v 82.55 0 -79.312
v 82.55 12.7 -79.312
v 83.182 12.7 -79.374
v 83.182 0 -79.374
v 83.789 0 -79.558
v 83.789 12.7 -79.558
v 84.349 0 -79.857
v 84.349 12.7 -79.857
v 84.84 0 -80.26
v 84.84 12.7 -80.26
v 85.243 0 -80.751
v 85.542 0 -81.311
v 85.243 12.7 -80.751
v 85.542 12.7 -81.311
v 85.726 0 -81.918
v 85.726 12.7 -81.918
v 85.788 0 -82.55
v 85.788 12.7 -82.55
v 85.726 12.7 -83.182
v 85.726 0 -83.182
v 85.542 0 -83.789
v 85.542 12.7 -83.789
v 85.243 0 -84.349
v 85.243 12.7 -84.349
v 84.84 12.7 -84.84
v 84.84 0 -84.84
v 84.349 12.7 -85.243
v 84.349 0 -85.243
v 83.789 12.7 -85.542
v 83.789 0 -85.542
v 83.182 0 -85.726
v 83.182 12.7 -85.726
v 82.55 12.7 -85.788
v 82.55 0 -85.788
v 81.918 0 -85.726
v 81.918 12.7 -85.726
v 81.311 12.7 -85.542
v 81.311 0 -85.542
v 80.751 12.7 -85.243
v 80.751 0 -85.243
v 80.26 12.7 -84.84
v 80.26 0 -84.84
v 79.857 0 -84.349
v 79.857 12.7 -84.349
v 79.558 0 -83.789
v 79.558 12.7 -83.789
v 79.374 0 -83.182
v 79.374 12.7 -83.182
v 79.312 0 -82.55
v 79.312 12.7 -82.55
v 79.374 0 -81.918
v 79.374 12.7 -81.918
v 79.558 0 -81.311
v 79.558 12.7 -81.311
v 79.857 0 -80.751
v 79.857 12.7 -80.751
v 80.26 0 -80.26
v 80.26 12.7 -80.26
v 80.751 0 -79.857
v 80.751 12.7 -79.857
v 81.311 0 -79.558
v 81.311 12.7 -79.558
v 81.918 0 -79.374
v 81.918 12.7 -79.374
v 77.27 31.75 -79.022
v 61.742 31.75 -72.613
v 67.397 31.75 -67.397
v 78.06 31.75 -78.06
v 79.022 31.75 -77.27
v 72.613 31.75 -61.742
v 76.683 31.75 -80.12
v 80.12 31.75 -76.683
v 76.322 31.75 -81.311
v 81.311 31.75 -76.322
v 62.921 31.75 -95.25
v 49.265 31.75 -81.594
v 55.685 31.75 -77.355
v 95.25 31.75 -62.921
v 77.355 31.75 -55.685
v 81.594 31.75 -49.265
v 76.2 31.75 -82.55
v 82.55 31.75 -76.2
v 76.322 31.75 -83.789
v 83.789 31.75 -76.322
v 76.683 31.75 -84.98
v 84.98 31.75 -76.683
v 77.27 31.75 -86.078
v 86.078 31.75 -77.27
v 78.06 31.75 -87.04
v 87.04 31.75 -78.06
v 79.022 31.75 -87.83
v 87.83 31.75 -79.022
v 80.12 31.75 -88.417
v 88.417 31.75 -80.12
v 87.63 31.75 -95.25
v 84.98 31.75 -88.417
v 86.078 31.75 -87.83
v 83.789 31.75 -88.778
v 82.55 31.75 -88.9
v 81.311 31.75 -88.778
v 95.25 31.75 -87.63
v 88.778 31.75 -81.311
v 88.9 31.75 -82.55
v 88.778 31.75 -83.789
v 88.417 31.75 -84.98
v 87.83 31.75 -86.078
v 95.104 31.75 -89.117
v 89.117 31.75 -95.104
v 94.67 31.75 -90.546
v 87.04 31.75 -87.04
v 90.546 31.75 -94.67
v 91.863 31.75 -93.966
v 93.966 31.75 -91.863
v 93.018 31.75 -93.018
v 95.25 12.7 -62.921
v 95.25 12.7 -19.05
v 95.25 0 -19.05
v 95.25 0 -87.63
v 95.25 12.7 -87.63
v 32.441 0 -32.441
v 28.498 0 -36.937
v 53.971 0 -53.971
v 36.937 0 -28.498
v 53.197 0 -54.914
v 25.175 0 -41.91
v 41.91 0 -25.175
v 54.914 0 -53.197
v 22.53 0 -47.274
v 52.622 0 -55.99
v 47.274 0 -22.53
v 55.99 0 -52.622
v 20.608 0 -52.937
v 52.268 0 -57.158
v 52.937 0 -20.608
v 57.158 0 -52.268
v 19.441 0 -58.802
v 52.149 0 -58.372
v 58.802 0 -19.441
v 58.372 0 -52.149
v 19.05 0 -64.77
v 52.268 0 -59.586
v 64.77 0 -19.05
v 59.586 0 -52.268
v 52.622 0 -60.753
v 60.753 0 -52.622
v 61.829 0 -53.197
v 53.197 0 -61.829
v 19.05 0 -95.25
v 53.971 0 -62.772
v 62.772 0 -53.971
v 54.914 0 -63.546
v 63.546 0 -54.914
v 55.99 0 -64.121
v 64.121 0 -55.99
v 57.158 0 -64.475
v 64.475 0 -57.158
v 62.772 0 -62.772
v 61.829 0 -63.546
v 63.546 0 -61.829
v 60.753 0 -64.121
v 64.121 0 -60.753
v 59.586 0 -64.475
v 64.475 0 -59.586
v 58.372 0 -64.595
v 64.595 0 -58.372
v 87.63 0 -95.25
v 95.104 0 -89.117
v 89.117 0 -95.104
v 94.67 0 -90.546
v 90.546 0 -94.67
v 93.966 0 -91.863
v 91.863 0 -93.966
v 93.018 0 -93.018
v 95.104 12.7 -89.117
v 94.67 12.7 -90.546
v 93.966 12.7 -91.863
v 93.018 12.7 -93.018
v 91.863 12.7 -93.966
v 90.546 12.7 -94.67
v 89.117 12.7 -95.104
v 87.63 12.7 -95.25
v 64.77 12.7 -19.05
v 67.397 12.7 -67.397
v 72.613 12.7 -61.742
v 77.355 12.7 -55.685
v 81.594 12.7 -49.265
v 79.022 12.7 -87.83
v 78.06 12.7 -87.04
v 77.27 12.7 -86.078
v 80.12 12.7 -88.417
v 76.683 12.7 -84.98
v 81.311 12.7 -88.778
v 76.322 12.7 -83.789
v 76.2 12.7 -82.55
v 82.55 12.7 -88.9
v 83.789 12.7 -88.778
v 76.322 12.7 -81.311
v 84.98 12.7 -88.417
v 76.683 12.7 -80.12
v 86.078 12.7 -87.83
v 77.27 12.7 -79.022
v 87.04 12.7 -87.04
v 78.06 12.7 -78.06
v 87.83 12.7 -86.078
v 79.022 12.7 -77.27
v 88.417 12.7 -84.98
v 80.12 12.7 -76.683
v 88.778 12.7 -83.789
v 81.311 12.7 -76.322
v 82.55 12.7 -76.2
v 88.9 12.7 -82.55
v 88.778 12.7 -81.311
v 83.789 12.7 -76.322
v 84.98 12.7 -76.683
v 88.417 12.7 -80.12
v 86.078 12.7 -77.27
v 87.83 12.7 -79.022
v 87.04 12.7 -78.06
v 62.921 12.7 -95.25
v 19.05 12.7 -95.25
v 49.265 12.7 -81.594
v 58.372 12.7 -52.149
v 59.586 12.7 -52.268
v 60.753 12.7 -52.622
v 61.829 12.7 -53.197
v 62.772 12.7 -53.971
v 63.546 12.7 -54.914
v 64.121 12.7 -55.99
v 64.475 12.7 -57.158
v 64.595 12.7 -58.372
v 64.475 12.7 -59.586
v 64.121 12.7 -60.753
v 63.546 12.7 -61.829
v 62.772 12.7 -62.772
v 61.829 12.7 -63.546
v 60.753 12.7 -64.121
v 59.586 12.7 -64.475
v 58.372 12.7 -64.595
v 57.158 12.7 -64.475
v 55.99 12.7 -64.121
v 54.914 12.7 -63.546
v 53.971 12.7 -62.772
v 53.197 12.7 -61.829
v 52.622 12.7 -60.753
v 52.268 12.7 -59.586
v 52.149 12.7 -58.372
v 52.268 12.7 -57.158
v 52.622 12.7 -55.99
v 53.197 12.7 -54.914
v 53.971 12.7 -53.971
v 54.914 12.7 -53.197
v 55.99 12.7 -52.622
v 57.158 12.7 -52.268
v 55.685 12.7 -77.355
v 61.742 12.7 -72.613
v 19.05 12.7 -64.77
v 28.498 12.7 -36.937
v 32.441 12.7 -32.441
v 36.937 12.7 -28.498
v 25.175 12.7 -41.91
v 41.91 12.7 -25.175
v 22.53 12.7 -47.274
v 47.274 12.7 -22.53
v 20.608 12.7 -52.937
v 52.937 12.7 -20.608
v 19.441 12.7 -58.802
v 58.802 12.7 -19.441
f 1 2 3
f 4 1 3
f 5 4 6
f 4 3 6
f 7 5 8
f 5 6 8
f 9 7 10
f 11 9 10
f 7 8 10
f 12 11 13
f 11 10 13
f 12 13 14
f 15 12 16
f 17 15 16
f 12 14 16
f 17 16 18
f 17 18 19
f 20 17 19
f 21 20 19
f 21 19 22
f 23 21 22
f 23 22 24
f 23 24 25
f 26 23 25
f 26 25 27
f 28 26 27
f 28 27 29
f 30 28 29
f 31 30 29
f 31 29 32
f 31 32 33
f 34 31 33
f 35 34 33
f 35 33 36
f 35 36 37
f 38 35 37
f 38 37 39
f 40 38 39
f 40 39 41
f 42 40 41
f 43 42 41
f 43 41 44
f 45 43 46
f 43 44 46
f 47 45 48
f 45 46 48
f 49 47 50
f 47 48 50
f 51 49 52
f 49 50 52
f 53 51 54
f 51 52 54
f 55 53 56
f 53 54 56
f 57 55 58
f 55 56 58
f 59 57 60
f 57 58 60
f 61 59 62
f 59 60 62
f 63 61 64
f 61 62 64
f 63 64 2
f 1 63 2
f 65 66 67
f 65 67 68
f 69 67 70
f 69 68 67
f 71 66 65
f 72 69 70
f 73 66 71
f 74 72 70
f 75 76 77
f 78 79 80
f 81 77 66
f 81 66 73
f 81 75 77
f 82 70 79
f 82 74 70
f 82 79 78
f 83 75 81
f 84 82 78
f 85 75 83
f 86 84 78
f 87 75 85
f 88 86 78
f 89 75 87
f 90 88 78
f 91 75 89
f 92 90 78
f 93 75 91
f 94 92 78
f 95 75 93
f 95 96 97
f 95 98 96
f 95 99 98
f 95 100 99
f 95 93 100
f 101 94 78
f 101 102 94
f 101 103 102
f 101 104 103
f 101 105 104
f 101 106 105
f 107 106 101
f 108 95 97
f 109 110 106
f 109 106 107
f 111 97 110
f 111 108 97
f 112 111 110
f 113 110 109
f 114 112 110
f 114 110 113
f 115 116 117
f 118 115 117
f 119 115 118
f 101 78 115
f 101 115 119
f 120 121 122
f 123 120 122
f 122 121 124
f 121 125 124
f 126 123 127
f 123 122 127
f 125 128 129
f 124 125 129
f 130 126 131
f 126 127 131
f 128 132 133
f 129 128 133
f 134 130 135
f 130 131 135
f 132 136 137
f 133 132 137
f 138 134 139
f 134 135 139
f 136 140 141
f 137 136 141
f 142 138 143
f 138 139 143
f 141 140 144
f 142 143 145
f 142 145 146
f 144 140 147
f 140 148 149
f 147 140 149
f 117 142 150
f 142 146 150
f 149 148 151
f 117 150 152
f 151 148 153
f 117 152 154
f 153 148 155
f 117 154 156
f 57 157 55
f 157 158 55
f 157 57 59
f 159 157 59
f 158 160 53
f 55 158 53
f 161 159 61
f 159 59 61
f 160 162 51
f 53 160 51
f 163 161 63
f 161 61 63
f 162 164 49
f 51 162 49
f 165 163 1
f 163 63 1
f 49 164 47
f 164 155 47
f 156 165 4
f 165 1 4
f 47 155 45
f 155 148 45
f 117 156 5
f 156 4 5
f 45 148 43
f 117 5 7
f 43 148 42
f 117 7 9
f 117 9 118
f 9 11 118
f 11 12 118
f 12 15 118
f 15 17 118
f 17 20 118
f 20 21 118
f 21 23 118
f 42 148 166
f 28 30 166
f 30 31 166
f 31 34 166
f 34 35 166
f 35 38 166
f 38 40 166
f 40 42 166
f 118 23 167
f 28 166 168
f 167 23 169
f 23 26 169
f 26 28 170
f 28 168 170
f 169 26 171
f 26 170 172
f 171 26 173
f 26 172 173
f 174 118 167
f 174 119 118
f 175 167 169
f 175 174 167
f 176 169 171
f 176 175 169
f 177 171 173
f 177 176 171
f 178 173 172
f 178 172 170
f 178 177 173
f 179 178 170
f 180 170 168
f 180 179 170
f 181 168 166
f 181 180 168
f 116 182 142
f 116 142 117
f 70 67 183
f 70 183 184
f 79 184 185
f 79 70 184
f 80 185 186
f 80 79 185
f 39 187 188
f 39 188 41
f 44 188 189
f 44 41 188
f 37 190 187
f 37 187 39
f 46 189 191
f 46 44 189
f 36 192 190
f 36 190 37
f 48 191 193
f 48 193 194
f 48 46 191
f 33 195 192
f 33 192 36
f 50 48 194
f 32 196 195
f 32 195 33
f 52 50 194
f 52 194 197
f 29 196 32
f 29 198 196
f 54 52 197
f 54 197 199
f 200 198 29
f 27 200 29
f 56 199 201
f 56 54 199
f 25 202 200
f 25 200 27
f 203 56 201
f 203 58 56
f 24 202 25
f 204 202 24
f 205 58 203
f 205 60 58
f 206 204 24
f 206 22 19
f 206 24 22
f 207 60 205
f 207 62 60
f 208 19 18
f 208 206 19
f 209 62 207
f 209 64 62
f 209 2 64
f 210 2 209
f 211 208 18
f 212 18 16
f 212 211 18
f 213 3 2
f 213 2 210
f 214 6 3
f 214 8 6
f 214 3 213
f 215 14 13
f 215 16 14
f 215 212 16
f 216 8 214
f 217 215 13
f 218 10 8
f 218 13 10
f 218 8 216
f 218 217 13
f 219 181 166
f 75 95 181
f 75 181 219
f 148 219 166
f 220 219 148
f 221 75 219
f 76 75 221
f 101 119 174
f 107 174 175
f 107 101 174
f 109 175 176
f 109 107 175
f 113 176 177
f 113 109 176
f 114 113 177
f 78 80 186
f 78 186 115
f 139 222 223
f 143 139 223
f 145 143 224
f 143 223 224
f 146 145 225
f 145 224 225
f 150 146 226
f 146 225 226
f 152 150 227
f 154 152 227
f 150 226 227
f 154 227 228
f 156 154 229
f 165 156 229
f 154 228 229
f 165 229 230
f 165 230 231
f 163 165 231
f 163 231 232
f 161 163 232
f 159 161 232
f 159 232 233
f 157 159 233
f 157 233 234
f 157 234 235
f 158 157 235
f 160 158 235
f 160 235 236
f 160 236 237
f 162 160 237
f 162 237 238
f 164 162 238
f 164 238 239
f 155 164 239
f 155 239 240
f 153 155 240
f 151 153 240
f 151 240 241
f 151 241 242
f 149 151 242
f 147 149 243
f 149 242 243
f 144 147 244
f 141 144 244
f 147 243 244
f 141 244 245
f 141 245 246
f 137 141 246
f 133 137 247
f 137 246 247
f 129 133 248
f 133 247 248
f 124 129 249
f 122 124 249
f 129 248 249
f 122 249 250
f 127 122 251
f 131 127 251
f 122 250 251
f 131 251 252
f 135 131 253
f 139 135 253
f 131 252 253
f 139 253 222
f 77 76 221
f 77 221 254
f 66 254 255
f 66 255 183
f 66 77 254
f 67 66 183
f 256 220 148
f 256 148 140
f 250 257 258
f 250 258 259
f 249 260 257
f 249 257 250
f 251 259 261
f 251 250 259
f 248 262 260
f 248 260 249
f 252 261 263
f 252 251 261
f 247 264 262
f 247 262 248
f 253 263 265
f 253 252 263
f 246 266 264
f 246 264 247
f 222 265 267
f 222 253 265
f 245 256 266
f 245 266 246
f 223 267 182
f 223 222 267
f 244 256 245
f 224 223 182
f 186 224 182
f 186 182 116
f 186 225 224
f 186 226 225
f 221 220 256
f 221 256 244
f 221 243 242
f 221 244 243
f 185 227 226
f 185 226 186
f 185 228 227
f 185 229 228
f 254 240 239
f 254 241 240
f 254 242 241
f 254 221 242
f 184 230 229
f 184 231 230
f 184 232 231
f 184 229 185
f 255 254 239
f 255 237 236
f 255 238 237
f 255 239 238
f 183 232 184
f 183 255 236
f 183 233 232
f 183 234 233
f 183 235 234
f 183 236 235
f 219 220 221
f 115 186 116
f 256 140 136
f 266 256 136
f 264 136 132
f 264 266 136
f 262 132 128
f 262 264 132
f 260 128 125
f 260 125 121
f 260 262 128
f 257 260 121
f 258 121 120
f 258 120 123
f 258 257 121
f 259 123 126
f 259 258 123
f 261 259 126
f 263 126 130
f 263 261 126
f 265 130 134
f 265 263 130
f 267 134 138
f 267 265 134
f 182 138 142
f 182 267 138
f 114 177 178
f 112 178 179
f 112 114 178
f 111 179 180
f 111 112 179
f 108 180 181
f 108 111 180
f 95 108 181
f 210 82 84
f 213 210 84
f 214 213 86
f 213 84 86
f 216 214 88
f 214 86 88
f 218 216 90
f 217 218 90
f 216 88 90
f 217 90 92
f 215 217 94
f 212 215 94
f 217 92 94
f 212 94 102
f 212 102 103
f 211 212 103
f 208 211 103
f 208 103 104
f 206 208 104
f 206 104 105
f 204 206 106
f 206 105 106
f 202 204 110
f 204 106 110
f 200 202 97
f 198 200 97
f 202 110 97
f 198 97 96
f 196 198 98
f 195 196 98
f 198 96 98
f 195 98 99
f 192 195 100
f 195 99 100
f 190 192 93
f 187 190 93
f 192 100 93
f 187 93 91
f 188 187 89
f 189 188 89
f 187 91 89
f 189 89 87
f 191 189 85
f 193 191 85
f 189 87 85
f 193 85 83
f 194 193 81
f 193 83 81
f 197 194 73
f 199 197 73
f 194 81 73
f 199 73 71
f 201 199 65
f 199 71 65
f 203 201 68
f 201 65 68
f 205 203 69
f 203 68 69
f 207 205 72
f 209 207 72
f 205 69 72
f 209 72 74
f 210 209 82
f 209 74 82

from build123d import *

# Parameters (mm, degrees)
SKETCH1_W               = 190.5
SKETCH1_H               = 190.5
BOSS_EXTRUDE1_DEPTH     = 12.7
FILLET1_R               = 7.62
BOSS_EXTRUDE3_START     = 19.05
BOSS_EXTRUDE3_DEPTH     = 19.05
CIRPATTERN1_COUNT       = 4
SKETCH8_R               = 6.223
CUT_EXTRUDE2_DEPTH      = 25.4
CUT_EXTRUDE6_DEPTH      = 137.044211564
CUT_EXTRUDE6_DEPTH_BACK = 137.044211564
SKETCH10_R              = 6.223
SKETCH11_R              = 6.35
SKETCH11_R_2            = 3.2385
CUT_EXTRUDE7_DEPTH      = 19.05
SKETCH11_4_R            = 3.2385
CUT_EXTRUDE8_DEPTH      = 139.395041457
FILLET3_R               = 12.7
BOSS_EXTRUDE5_DEPTH     = 12.7


with BuildPart() as part:
    # Sketch1 → Boss-Extrude1 (new body)
    with BuildSketch(Plane(origin=(0, 0, 0), x_dir=(1, 0, 0), z_dir=(0, 1, 0))):
        Rectangle(SKETCH1_W, SKETCH1_H)
    extrude(amount=BOSS_EXTRUDE1_DEPTH)

    # Fillet1
    fillet1_edges = [part.edges().sort_by_distance(p)[0] for p in [
        (95.25, 6.35, 95.25),
        (-95.25, 6.35, 95.25),
        (-95.25, 6.35, -95.25),
        (95.25, 6.35, -95.25),
    ]]
    fillet(fillet1_edges, radius=FILLET1_R)

    # Sketch7 → Boss-Extrude3 (add)
    with BuildSketch(Plane(origin=(0, 12.7, 0), x_dir=(1, 0, 0), z_dir=(0, 1, 0)).offset(BOSS_EXTRUDE3_START)):
        with BuildLine():
            Line((67.396822189, 67.396822189), (93.018153673, 93.018153673))
            ThreePointArc((93.018153673, 93.018153673), (90.546047755, 94.669962038), (87.63, 95.25))
            Line((87.63, 95.25), (62.921077964, 95.25))
            Line((62.921077964, 95.25), (49.265209936, 81.594131972))
            ThreePointArc((49.265209936, 81.594131972), (58.761367718, 75.045086089), (67.396822189, 67.396822189))
        make_face()
        with BuildLine():
            ThreePointArc((95.25, 87.63), (94.669962038, 90.546047755), (93.018153673, 93.018153673))
            Line((93.018153673, 93.018153673), (67.396822189, 67.396822189))
            ThreePointArc((67.396822189, 67.396822189), (75.045086089, 58.761367718), (81.594131972, 49.265209936))
            Line((81.594131972, 49.265209936), (95.25, 62.921077964))
            Line((95.25, 62.921077964), (95.25, 87.63))
        make_face()
    boss_extrude3 = extrude(amount=-BOSS_EXTRUDE3_DEPTH)

    # CirPattern1: Boss-Extrude3 ×4 about axis
    cirpattern1_axis = Axis((0, 0, 0), (0, 1, 0))
    for i in range(1, CIRPATTERN1_COUNT):
        add(boss_extrude3.rotate(cirpattern1_axis, i * 360 / CIRPATTERN1_COUNT))

    # Sketch8 → Cut-Extrude2 (cut)
    with BuildSketch(Plane(origin=(0, 12.7, 0), x_dir=(1, 0, 0), z_dir=(0, 1, 0))):
        with Locations(Location((0, 82.55, 0), (0, 0, 270))):
            Circle(SKETCH8_R)
        with Locations(Location((58.371664787, 58.371664787, 0), (0, 0, 270))):
            Circle(SKETCH8_R)
        with Locations(Location((82.55, 0, 0), (0, 0, 270))):
            Circle(SKETCH8_R)
        with Locations(Location((58.371664787, -58.371664787, 0), (0, 0, 270))):
            Circle(SKETCH8_R)
        with Locations(Location((0, -82.55, 0), (0, 0, 270))):
            Circle(SKETCH8_R)
        with Locations(Location((-58.371664787, -58.371664787, 0), (0, 0, 270))):
            Circle(SKETCH8_R)
        with Locations(Location((-82.55, 0, 0), (0, 0, 270))):
            Circle(SKETCH8_R)
        with Locations(Location((-58.371664787, 58.371664787, 0), (0, 0, 270))):
            Circle(SKETCH8_R)
    extrude(amount=-CUT_EXTRUDE2_DEPTH, mode=Mode.SUBTRACT)

    # Sketch10 → Cut-Extrude6 (cut, two sides: drawn at the far end of the back side and taken through both)
    with BuildSketch(Plane(origin=(0, 12.7, 0), x_dir=(1, 0, 0), z_dir=(0, 1, 0)).offset(-CUT_EXTRUDE6_DEPTH_BACK)):
        with BuildLine():
            Line((95.25, -62.921077964), (95.25, 38.1))
            Line((95.25, 38.1), (38.1, 38.1))
            Line((38.1, 38.1), (38.1, 95.25))
            Line((38.1, 95.25), (-62.921077964, 95.25))
            Line((-62.921077964, 95.25), (-49.265209936, 81.594131972))
            ThreePointArc((-49.265209936, 81.594131972), (-67.396822189, 67.396822189), (-81.594131972, 49.265209936))
            Line((-81.594131972, 49.265209936), (-95.25, 62.921077964))
            Line((-95.25, 62.921077964), (-95.25, -62.921077964))
            Line((-95.25, -62.921077964), (-81.594131972, -49.265209936))
            ThreePointArc((-81.594131972, -49.265209936), (-67.396822189, -67.396822189), (-49.265209936, -81.594131972))
            Line((-49.265209936, -81.594131972), (-62.921077964, -95.25))
            Line((-62.921077964, -95.25), (62.921077964, -95.25))
            Line((62.921077964, -95.25), (49.265209936, -81.594131972))
            ThreePointArc((49.265209936, -81.594131972), (67.396822189, -67.396822189), (81.594131972, -49.265209936))
            Line((81.594131972, -49.265209936), (95.25, -62.921077964))
        make_face()
        with Locations((-58.371664787, -58.371664787)):
            Circle(SKETCH10_R, mode=Mode.SUBTRACT)
        with Locations((-82.55, 0)):
            Circle(SKETCH10_R, mode=Mode.SUBTRACT)
        with Locations((0, -82.55)):
            Circle(SKETCH10_R, mode=Mode.SUBTRACT)
        with Locations((58.371664787, -58.371664787)):
            Circle(SKETCH10_R, mode=Mode.SUBTRACT)
        with Locations((-58.371664787, 58.371664787)):
            Circle(SKETCH10_R, mode=Mode.SUBTRACT)
        with Locations((0, 82.55)):
            Circle(SKETCH10_R, mode=Mode.SUBTRACT)
        with Locations((82.55, 0)):
            Circle(SKETCH10_R, mode=Mode.SUBTRACT)
    extrude(amount=CUT_EXTRUDE6_DEPTH + CUT_EXTRUDE6_DEPTH_BACK, mode=Mode.SUBTRACT)


with BuildPart() as cut_extrude6_kept_piece:
    # of the separate pieces the step leaves, the one the design keeps (cut_extrude6_pieces_kept)
    add(part.part.solids().sort_by_distance((38.1, 0, -38.1))[0])

    # Sketch11 → Cut-Extrude7 (cut)
    with BuildSketch(Plane(origin=(0, 31.75, 0), x_dir=(1, 0, 0), z_dir=(0, 1, 0))):
        with Locations(Location((82.55, 82.55, 0), (0, 0, 270))):
            Circle(SKETCH11_R)
        with Locations(Location((82.55, 82.55, 0), (0, 0, 270))):
            Circle(SKETCH11_R_2, mode=Mode.SUBTRACT)
    extrude(amount=-CUT_EXTRUDE7_DEPTH, mode=Mode.SUBTRACT)

    # Sketch11<4> → Cut-Extrude8 (cut, through all)
    with BuildSketch(Plane(origin=(0, 31.75, 0), x_dir=(1, 0, 0), z_dir=(0, 1, 0))):
        with Locations(Location((82.55, 82.55, 0), (0, 0, 270))):
            Circle(SKETCH11_4_R)
    extrude(amount=-CUT_EXTRUDE8_DEPTH, mode=Mode.SUBTRACT)

    # Fillet3
    fillet3_edges = [cut_extrude6_kept_piece.edges().sort_by_distance(p)[0] for p in [
        (38.1, 6.35, -95.25),
        (38.1, 6.35, -38.1),
        (95.25, 6.35, -38.1),
    ]]
    fillet(fillet3_edges, radius=FILLET3_R)

    # Sketch12 → Boss-Extrude5 (add)
    with BuildSketch(Plane(origin=(0, 12.7, 0), x_dir=(1, 0, 0), z_dir=(0, 1, 0))):
        with BuildLine():
            ThreePointArc((38.1, 82.55), (41.819743879, 91.530256121), (50.8, 95.25))
            Line((50.8, 95.25), (19.05, 95.25))
            Line((19.05, 95.25), (19.05, 64.77))
            Line((19.05, 64.77), (38.1, 64.77))
            Line((38.1, 64.77), (38.1, 82.55))
        make_face()
        with BuildLine():
            Line((82.55, 38.1), (64.77, 38.1))
            Line((64.77, 38.1), (64.77, 19.05))
            Line((64.77, 19.05), (95.25, 19.05))
            Line((95.25, 19.05), (95.25, 50.8))
            ThreePointArc((95.25, 50.8), (91.530256121, 41.819743879), (82.55, 38.1))
        make_face()
        with BuildLine():
            Line((38.1, 50.8), (38.1, 64.77))
            Line((38.1, 64.77), (19.05, 64.77))
            ThreePointArc((19.05, 64.77), (32.441077964, 32.441077964), (64.77, 19.05))
            Line((64.77, 19.05), (64.77, 38.1))
            Line((64.77, 38.1), (50.8, 38.1))
            ThreePointArc((50.8, 38.1), (41.819743879, 41.819743879), (38.1, 50.8))
        make_face()
    extrude(amount=-BOSS_EXTRUDE5_DEPTH)


solid = cut_extrude6_kept_piece.part
